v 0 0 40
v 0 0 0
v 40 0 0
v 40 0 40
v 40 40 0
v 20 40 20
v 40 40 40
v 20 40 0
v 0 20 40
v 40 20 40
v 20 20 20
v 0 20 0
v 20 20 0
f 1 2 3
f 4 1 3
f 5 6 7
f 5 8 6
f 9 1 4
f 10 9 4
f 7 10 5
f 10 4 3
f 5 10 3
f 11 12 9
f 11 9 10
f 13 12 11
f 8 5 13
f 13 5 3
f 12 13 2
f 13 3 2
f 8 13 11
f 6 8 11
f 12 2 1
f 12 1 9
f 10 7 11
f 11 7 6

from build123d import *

# Parameters (mm, degrees)
SKETCH1_W           = 40
SKETCH1_H           = 20
BOSS_EXTRUDE1_DEPTH = 40
SKETCH2_W           = 20
SKETCH2_H           = 20
BOSS_EXTRUDE2_DEPTH = 40
CUT_EXTRUDE2_DEPTH  = 20
CUT_EXTRUDE3_DEPTH  = 20
BOSS_EXTRUDE3_DEPTH = 20
BOSS_EXTRUDE4_DEPTH = 20
CUT_EXTRUDE4_DEPTH  = 20


with BuildPart() as part:
    # Sketch1 → Boss-Extrude1 (new body)
    with BuildSketch(Plane.XY):
        with Locations((20, 10)):
            Rectangle(SKETCH1_W, SKETCH1_H)
    extrude(amount=BOSS_EXTRUDE1_DEPTH)

    # Sketch2 → Boss-Extrude2 (add)
    with BuildSketch(Plane.XY.offset(40)):
        with Locations((30, 30)):
            Rectangle(SKETCH2_W, SKETCH2_H)
    extrude(amount=-BOSS_EXTRUDE2_DEPTH)

    # Sketch3 → Cut-Extrude2 (cut)
    with BuildSketch(Plane(origin=(0, 40, 0), x_dir=(1, 0, 0), z_dir=(0, 1, 0))):
        Polygon((40, -40), (40, -20), (20, -40), align=None)
    extrude(amount=-CUT_EXTRUDE2_DEPTH, mode=Mode.SUBTRACT)

    # Sketch4 → Cut-Extrude3 (cut)
    with BuildSketch(Plane(origin=(0, 40, 0), x_dir=(1, 0, 0), z_dir=(0, 1, 0))):
        Polygon((40, 0), (20, -20), (20, 0), align=None)
    extrude(amount=-CUT_EXTRUDE3_DEPTH, mode=Mode.SUBTRACT)

    # Sketch5 → Boss-Extrude3 (add)
    with BuildSketch(Plane(origin=(0, 20, 0), x_dir=(1, 0, 0), z_dir=(0, 1, 0))):
        Polygon((20, 0), (20, -20), (40, 0), align=None)
    extrude(amount=BOSS_EXTRUDE3_DEPTH)

    # Sketch6 → Boss-Extrude4 (add)
    with BuildSketch(Plane(origin=(0, 20, 0), x_dir=(1, 0, 0), z_dir=(0, 1, 0))):
        Polygon((20, -40), (40, -40), (40, -20), align=None)
    extrude(amount=BOSS_EXTRUDE4_DEPTH)

    # Sketch7 → Cut-Extrude4 (cut)
    with BuildSketch(Plane(origin=(0, 40, 0), x_dir=(1, 0, 0), z_dir=(0, 1, 0))):
        Polygon((20, -20), (20, -40), (30, -30), align=None)
        Polygon((30, -30), (20, -40), (40, -40), align=None)
    extrude(amount=-CUT_EXTRUDE4_DEPTH, mode=Mode.SUBTRACT)


solid = part.part
